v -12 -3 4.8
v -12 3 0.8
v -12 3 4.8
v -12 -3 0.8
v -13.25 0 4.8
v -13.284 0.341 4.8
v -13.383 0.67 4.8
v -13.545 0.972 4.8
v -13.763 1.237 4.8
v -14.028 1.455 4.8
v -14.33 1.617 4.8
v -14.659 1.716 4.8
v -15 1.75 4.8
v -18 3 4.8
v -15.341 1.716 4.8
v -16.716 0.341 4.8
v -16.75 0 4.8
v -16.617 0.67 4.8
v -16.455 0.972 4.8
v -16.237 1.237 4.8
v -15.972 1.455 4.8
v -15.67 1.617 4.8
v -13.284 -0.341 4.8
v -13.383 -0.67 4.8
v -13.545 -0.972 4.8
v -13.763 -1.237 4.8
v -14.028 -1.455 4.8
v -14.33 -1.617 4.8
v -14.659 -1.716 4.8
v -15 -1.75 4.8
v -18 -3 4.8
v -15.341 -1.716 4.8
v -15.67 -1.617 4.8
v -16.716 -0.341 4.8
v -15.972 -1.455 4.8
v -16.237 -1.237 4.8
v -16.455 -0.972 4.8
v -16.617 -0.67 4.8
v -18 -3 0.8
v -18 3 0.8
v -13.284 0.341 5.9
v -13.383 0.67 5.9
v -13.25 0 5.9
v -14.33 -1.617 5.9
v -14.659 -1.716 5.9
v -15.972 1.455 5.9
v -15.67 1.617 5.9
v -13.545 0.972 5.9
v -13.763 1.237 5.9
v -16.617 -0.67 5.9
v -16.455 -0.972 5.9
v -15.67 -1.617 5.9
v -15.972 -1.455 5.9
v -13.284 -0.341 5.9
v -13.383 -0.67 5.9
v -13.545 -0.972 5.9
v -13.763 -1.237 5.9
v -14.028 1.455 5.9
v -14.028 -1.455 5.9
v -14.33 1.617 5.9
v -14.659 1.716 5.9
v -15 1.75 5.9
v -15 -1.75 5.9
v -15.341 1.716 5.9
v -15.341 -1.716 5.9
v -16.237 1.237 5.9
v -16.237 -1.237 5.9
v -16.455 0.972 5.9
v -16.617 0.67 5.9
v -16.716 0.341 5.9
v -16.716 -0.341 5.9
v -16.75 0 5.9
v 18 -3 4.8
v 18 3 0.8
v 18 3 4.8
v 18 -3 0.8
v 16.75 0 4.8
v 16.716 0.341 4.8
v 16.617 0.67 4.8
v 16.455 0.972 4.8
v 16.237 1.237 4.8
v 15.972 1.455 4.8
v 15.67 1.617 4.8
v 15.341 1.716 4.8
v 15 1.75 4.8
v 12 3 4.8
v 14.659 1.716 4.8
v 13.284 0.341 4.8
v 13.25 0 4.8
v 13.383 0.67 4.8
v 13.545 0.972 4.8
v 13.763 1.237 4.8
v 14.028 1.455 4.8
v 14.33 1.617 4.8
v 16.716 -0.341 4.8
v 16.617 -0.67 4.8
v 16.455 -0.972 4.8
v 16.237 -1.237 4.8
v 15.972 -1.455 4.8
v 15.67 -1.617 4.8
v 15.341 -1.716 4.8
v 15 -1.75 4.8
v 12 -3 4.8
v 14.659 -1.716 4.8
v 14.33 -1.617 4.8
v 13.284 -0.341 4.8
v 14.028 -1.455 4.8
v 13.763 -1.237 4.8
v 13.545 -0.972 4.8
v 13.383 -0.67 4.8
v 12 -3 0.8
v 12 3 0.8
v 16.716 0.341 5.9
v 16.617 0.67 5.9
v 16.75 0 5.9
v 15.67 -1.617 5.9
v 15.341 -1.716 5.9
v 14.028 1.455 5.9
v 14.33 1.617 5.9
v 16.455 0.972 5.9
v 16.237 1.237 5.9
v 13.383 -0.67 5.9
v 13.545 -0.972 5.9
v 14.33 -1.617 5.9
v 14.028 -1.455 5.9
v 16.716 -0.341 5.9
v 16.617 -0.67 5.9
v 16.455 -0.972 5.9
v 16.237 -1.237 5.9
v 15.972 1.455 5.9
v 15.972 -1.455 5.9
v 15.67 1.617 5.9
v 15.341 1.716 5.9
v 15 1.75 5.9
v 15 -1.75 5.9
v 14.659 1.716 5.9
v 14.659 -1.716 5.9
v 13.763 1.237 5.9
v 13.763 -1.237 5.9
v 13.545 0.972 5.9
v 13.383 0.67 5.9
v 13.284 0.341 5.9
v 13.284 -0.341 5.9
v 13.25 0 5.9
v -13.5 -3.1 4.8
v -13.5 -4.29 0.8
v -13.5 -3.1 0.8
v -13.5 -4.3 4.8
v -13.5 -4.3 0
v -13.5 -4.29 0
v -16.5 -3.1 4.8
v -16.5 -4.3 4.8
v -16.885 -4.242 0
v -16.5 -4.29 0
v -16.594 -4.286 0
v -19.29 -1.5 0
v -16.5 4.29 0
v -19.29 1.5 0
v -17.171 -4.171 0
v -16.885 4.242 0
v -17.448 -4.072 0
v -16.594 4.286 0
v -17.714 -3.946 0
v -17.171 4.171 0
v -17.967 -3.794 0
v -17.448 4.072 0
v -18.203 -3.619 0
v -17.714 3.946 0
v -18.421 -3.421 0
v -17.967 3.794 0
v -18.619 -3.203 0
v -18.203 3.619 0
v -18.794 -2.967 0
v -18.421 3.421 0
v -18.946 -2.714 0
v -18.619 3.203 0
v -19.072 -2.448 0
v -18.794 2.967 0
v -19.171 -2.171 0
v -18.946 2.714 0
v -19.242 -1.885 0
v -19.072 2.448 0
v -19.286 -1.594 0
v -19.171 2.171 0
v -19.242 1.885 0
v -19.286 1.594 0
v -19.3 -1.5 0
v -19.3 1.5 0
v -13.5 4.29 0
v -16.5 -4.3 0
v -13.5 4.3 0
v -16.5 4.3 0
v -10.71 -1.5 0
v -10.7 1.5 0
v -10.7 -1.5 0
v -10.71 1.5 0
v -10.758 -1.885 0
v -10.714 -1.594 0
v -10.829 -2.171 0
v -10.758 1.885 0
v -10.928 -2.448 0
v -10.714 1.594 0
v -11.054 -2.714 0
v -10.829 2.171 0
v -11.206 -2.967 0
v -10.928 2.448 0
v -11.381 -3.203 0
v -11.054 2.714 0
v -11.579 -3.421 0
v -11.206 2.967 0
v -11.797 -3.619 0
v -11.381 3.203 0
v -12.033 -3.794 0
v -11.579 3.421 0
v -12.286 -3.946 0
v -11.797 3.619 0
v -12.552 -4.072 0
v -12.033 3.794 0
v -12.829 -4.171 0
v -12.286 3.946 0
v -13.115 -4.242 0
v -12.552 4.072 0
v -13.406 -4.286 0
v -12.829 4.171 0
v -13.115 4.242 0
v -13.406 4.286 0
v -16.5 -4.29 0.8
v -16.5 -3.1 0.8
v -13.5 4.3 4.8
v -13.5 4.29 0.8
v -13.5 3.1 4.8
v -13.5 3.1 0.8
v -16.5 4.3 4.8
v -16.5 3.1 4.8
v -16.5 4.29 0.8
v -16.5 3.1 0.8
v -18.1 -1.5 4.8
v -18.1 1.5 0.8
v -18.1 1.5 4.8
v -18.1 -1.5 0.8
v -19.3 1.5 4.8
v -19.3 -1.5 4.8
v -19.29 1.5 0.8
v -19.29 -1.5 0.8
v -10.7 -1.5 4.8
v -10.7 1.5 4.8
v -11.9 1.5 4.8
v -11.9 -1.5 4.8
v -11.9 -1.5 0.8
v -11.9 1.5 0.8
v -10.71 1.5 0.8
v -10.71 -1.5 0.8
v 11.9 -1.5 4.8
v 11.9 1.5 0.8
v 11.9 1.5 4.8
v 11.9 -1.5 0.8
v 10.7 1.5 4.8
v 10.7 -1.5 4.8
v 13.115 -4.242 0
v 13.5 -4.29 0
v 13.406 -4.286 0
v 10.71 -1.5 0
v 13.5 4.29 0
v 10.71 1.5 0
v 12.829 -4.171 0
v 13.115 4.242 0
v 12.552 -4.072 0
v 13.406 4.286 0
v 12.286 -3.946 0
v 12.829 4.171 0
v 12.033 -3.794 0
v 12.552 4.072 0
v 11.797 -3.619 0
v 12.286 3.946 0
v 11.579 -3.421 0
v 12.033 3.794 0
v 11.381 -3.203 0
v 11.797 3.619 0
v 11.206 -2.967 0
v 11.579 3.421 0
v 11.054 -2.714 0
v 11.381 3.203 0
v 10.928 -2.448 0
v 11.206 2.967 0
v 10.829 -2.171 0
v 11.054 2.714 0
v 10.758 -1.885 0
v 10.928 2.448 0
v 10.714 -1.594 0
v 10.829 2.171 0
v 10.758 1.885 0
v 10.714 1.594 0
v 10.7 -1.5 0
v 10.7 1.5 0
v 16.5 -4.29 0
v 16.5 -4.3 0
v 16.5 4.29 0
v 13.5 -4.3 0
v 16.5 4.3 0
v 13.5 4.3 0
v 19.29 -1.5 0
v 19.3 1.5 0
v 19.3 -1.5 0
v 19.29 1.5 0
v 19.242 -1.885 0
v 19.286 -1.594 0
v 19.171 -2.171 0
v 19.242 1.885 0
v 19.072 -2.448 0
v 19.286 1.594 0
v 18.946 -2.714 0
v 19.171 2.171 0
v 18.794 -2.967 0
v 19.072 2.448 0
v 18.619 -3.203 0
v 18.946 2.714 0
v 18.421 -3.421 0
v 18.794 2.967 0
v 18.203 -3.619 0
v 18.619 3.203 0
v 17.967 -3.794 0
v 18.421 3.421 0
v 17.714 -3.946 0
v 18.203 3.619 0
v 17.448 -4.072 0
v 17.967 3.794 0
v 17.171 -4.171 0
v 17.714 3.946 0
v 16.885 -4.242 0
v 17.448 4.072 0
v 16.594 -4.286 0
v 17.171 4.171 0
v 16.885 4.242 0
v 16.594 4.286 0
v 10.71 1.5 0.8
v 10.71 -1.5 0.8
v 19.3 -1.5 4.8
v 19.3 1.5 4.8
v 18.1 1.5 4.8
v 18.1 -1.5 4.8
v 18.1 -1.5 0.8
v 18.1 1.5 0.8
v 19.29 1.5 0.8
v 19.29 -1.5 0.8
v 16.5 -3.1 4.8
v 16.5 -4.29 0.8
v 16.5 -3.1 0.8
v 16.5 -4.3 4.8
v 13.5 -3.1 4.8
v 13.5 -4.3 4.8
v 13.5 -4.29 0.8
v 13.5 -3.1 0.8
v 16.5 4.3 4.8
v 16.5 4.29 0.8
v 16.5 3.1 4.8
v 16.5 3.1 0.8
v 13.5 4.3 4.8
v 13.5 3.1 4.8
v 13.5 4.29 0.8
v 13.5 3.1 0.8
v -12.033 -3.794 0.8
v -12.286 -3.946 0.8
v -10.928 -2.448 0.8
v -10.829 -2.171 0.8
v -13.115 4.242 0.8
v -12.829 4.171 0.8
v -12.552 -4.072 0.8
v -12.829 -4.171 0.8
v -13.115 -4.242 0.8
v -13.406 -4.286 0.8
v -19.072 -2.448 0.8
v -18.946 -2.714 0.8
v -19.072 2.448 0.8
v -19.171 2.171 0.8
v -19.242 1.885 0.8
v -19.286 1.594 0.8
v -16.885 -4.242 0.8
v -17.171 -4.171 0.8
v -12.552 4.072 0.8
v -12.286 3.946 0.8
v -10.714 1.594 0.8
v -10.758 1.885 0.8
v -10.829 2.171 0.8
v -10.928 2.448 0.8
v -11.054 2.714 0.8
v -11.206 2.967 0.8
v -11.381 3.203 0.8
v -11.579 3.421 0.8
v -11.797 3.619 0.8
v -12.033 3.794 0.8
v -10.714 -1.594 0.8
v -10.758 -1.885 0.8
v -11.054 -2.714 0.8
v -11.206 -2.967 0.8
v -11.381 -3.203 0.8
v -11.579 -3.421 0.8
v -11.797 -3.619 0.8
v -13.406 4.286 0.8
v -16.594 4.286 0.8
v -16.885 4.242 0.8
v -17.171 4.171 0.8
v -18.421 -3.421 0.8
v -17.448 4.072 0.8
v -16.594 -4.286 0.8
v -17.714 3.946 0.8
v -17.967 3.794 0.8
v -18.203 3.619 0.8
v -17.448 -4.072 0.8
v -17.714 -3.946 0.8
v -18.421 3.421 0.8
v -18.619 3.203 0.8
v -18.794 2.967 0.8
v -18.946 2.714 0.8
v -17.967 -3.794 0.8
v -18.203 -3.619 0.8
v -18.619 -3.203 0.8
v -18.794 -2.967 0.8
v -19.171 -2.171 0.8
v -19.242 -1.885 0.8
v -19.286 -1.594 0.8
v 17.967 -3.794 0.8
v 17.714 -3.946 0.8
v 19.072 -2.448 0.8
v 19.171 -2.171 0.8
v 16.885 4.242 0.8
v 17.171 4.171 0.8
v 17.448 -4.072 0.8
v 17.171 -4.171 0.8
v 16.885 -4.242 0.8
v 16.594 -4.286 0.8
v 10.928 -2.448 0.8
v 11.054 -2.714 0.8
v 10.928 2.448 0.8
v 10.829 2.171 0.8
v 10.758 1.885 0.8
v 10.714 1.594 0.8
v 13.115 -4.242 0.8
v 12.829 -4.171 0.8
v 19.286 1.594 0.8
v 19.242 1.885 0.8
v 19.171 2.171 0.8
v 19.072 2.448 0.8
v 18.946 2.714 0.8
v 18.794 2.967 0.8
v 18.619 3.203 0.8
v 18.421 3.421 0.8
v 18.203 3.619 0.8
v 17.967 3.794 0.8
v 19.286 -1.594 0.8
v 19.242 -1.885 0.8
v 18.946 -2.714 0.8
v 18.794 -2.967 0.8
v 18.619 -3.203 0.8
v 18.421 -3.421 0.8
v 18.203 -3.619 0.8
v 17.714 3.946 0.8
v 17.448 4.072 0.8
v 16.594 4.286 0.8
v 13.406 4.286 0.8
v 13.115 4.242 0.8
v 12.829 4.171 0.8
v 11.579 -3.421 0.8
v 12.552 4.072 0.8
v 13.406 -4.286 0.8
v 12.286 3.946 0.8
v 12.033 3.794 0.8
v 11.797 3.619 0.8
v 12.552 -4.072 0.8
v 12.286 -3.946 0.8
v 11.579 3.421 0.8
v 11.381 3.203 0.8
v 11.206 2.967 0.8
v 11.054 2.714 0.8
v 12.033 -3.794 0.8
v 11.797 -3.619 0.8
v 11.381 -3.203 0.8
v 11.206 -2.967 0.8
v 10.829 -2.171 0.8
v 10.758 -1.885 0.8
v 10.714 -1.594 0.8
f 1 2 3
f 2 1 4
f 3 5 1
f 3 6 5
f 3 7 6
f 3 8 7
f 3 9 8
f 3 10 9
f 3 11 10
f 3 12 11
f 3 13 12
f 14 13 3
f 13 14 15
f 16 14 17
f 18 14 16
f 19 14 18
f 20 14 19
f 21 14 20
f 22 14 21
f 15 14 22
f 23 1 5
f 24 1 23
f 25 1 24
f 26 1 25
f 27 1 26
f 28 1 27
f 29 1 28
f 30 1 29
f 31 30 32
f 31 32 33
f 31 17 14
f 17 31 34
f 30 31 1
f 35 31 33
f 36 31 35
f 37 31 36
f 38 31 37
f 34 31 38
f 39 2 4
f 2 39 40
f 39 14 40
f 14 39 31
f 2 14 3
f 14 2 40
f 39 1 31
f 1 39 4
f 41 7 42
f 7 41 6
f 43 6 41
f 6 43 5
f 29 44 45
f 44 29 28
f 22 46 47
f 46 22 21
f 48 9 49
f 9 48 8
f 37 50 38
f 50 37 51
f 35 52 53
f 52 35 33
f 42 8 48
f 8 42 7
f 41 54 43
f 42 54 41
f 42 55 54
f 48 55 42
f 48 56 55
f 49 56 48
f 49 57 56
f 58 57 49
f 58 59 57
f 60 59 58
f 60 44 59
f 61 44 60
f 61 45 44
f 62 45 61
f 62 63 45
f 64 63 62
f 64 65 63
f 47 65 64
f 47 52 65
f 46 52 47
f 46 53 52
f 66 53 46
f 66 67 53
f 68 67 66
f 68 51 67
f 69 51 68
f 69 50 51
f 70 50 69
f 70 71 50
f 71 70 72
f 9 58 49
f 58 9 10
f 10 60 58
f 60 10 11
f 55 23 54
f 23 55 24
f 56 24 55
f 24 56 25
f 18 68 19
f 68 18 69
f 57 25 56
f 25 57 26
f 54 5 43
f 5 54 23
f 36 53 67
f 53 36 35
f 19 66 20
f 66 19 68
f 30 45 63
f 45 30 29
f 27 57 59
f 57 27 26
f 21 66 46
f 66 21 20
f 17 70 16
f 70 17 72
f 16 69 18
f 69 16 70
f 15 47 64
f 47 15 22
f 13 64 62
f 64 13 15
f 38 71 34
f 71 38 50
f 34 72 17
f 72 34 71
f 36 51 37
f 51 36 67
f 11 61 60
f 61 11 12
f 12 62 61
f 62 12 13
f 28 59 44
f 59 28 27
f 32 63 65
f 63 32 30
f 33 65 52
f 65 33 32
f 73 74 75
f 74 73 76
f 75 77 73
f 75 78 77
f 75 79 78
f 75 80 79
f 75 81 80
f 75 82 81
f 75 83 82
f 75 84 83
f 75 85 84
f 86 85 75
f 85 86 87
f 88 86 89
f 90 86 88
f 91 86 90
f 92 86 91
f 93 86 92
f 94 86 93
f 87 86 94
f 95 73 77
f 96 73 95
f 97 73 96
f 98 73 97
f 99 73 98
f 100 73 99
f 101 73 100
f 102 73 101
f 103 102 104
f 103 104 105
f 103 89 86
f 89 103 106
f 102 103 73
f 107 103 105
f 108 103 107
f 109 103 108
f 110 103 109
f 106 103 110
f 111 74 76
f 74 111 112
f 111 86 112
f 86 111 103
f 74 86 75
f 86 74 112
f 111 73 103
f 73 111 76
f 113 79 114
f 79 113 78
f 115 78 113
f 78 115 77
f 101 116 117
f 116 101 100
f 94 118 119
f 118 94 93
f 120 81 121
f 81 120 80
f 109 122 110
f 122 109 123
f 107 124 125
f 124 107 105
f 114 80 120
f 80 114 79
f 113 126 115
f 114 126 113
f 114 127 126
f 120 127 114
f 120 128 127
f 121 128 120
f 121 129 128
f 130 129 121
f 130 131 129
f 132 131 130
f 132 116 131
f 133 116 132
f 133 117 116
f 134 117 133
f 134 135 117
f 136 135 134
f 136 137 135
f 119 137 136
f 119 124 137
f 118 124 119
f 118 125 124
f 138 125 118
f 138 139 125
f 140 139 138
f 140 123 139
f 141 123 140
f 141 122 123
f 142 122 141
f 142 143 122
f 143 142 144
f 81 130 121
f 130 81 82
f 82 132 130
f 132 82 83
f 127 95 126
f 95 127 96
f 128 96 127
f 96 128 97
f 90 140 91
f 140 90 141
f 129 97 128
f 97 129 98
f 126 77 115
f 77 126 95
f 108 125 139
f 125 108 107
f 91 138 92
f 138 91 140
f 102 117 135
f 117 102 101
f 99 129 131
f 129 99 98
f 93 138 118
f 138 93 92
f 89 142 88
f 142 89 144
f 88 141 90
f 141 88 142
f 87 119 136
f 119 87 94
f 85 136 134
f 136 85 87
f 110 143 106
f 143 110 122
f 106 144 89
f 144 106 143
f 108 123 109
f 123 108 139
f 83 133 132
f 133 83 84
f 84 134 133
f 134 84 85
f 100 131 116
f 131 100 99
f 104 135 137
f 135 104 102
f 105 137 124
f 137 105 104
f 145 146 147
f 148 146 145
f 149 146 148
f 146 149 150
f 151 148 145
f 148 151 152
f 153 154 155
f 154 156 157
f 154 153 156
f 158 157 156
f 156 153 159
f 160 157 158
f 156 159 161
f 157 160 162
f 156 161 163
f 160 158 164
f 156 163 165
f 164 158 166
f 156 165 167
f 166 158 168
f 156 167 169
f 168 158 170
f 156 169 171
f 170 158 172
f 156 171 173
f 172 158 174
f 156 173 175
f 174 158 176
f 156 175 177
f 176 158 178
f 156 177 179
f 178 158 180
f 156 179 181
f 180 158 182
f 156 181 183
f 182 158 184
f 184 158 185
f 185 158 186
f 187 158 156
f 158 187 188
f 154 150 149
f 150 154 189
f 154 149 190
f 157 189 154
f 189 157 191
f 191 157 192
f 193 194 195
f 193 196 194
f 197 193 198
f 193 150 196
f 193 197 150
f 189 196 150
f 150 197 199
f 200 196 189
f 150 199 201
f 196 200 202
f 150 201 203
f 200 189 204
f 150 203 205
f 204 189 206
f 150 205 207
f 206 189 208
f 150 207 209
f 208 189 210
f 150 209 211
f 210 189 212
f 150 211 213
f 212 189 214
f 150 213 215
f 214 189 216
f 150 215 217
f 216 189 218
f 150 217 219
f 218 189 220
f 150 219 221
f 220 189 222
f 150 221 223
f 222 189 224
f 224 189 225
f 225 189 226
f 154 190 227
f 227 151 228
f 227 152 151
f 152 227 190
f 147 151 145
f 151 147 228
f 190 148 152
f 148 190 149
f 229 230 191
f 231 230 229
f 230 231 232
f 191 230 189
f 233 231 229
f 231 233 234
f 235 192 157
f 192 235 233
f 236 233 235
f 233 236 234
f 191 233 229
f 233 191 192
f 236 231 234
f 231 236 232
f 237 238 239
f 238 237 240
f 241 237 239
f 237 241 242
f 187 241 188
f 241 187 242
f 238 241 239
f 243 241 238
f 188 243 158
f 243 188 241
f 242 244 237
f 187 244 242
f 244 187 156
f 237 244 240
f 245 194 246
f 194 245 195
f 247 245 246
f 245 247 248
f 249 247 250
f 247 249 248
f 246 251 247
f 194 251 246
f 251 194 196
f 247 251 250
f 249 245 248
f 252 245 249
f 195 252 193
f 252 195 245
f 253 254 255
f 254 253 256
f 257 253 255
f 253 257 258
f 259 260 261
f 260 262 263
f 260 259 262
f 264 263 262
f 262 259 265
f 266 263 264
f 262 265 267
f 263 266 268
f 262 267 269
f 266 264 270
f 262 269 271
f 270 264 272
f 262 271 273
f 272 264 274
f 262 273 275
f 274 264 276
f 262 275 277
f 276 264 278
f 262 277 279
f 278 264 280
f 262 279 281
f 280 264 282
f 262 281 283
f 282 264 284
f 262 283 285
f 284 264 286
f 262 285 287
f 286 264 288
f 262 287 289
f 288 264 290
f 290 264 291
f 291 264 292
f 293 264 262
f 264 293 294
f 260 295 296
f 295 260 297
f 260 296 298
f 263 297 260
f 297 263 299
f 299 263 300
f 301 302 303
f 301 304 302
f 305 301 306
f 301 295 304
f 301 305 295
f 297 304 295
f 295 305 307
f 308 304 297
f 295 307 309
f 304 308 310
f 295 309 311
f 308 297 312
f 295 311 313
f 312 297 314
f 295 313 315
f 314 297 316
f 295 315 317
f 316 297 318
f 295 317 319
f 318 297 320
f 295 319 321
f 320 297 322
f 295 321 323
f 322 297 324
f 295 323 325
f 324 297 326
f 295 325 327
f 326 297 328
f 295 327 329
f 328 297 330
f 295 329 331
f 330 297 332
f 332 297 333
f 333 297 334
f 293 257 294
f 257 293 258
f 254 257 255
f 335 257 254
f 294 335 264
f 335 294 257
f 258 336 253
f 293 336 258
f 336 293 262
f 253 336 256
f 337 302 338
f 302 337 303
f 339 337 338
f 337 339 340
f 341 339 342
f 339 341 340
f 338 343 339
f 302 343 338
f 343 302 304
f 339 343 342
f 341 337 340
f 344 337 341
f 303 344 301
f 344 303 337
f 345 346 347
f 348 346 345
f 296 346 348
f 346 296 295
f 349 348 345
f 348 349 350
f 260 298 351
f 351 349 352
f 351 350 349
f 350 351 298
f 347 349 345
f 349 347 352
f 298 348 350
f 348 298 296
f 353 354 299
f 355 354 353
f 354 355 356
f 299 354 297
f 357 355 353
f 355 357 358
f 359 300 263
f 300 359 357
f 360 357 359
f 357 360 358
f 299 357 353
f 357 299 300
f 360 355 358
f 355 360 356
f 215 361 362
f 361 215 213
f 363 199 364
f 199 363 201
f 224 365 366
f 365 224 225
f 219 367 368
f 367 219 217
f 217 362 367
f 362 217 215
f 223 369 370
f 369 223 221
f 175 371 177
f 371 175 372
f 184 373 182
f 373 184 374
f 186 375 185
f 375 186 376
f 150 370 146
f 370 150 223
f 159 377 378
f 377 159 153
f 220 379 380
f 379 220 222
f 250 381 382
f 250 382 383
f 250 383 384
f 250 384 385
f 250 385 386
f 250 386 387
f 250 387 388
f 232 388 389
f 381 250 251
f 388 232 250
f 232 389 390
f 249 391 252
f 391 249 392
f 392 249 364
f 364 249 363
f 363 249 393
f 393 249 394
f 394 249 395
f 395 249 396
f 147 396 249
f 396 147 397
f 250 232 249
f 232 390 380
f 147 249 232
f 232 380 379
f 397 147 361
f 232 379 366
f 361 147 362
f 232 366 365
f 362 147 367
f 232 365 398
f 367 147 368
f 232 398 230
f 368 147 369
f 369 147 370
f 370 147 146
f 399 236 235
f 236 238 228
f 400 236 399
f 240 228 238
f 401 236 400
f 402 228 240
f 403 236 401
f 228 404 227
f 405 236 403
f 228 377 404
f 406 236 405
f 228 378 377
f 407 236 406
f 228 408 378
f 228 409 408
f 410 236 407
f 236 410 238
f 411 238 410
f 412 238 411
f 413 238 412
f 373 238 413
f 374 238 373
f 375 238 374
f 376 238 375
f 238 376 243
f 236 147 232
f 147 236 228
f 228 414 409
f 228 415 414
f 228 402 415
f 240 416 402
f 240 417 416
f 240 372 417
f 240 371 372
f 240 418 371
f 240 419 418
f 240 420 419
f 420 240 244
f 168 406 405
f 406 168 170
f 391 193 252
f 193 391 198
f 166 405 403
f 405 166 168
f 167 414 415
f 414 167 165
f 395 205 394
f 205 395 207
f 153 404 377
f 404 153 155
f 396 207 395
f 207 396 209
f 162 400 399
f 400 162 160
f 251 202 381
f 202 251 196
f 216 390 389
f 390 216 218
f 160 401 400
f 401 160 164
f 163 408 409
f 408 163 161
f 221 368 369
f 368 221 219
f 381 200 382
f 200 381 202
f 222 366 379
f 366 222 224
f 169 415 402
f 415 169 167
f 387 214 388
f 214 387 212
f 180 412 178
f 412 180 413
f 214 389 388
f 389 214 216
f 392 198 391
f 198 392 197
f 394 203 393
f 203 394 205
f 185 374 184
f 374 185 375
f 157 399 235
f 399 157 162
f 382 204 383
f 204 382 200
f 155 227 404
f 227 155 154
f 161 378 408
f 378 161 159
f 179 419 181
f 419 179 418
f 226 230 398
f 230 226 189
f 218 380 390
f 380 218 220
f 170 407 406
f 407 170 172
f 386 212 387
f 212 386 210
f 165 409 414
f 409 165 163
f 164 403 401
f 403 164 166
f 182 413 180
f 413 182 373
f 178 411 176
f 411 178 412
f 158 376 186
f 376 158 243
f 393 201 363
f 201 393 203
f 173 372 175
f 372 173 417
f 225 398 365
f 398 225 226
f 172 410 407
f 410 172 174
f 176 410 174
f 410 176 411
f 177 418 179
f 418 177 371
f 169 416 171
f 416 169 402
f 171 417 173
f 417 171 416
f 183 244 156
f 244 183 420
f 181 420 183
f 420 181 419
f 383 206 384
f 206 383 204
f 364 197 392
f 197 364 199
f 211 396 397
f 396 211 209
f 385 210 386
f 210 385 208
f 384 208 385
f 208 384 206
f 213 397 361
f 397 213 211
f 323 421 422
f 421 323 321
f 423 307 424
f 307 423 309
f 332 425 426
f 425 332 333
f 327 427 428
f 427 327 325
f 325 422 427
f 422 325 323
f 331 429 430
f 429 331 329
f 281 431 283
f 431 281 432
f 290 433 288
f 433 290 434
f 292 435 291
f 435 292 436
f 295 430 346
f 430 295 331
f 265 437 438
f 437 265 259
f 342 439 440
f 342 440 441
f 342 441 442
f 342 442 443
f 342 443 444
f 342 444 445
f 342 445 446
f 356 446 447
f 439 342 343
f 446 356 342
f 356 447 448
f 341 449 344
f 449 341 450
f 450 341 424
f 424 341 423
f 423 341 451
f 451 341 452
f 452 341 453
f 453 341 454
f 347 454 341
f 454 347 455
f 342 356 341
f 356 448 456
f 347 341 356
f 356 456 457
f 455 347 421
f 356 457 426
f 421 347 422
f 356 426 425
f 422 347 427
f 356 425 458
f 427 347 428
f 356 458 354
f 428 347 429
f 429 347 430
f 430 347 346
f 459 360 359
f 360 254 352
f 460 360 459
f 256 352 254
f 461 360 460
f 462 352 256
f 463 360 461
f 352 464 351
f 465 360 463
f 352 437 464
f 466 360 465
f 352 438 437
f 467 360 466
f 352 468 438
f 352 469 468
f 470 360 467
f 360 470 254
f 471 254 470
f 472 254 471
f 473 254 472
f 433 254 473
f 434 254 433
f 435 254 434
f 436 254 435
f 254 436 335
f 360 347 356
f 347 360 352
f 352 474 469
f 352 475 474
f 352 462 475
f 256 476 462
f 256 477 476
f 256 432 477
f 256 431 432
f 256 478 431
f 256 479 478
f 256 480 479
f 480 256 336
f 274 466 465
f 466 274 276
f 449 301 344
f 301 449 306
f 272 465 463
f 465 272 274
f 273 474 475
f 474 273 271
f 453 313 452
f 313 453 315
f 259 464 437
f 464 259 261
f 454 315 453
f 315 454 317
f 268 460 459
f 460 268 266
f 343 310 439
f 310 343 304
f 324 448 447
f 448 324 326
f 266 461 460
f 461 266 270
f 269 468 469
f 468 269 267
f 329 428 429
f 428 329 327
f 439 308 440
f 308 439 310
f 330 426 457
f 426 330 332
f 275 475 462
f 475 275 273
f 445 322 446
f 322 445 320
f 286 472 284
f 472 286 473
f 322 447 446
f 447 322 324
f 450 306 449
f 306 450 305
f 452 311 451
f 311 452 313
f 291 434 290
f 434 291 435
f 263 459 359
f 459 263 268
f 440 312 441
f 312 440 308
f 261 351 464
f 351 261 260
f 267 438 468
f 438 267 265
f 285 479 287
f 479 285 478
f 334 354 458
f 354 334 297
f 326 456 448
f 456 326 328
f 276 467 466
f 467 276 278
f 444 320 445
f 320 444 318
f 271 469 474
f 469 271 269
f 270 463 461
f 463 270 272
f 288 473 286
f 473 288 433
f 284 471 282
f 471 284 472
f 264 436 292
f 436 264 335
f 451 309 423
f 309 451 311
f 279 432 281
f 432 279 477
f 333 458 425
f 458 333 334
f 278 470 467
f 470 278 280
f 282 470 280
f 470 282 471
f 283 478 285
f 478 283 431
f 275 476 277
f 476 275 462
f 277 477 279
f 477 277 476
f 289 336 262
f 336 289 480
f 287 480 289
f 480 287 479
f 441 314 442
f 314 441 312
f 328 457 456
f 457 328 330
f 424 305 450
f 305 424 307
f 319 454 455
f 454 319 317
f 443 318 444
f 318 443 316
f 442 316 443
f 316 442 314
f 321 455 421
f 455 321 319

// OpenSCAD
EPSILON = 0.001;

BUTTON_SIZE = 6;
BUTTON_HEIGHT = 4;

WALL_THICKNESS = 1.2;
BUTTON_MARGIN = 0.1;

/**
 * Buttons.
 *
 * @param positiveShape
 *     if true, draw only the positive part.
 *     if false, draw only the negative part.
 */
module PushButtons(baseThickness = 0.8,
                   distanceBetweenButtons = 30,
                   positiveShape = true) {
    if (positiveShape) {
        for (x = [-distanceBetweenButtons / 2, distanceBetweenButtons / 2])
            translate([x, 0, baseThickness]) {
                // Base
                translate([-BUTTON_SIZE / 2, -BUTTON_SIZE / 2, 0])
                    cube([BUTTON_SIZE, BUTTON_SIZE, BUTTON_HEIGHT]);
                
                // Moving part
                diameter = 3.5;
                
                translate([diameter / 2 + (BUTTON_SIZE - diameter) / 2 - BUTTON_SIZE / 2,
                           diameter / 2 + (BUTTON_SIZE - diameter) / 2 - BUTTON_SIZE / 2,
                           0])
                    cylinder(h = 5.1, d = diameter, $fn = 32);
            }
    }
}


/**
 * Button holders.
 *
 * @param positiveShape
 *     if true, draw only the positive part.
 *     if false, draw only the negative part.
 */
module PushButtons_holder(baseThickness = 0.8, distanceBetweenButtons = 30, positiveShape = true) {
    for (x = [-distanceBetweenButtons / 2, distanceBetweenButtons / 2]) {
        // Base
        baseSize = BUTTON_SIZE + 2 * (WALL_THICKNESS + BUTTON_MARGIN);
        if (positiveShape) {
            translate([-baseSize / 2 + x, -baseSize / 2, 0])
                linear_extrude(height = baseThickness)
                    offset(r = 3, $fn = 64)
                        offset(r = -3, $fn = 64)
                            square([baseSize, baseSize]);
        }
        
        // Horizontal wall around each button
        wallWidth = BUTTON_SIZE - 3;
        wallHeight = BUTTON_HEIGHT + baseThickness;
        if (positiveShape) {
            for (y = [-BUTTON_SIZE / 2 - WALL_THICKNESS / 2 - BUTTON_MARGIN,
                      BUTTON_SIZE / 2 + WALL_THICKNESS / 2 + BUTTON_MARGIN])
                translate([-wallWidth / 2 + x, -WALL_THICKNESS / 2 + y, 0]) {
                    cube([wallWidth, WALL_THICKNESS, wallHeight]);
                }
        }
        
        // Vertical wall around each button
        if (positiveShape) {
            for (x = [-(distanceBetweenButtons + BUTTON_SIZE + WALL_THICKNESS) / 2 - BUTTON_MARGIN,
                      -(distanceBetweenButtons - BUTTON_SIZE - WALL_THICKNESS) / 2 + BUTTON_MARGIN,
                      (distanceBetweenButtons - BUTTON_SIZE - WALL_THICKNESS) / 2 - BUTTON_MARGIN,
                      (distanceBetweenButtons + BUTTON_SIZE + WALL_THICKNESS) / 2 + BUTTON_MARGIN]) {
                translate([-WALL_THICKNESS / 2 + x, -wallWidth / 2, 0]) {
                    cube([WALL_THICKNESS, wallWidth, wallHeight]);
                }
            }
        }
    }
}

/**
 * Buttons cover on the front panel.
 *
 * @param positiveShape
 *     if true, draw only the positive part.
 *     if false, draw only the negative part.
 */
module PushButtons_cover(baseThickness = 0.8, width = 50, depth = 18, positiveShape = true) {
    // Cut the buttons in the cover
    if (!positiveShape) {
        gap = 0.4;
        centralSupportWidth = 10;
        
        difference() {
            translate([0, 0, -EPSILON])
                linear_extrude(height = baseThickness + 2 * EPSILON)
                    difference() {
                        _PushButtons_coverShape(width, depth);
                        translate([gap, gap])
                            _PushButtons_coverShape(width - 2 * gap, depth - 2 * gap);
                    }
                
            // Central holder
            translate([(width - centralSupportWidth) / 2, 0, -0.1])
                cube([centralSupportWidth, depth * 2, baseThickness]);
        }
    }
}

module _PushButtons_coverShape(width = 50, depth = 18) {
    circleRadius = width / 2;
    cornerRadius = 4;
    outerCornerRadius = 2;
    
    offset(r = outerCornerRadius, $fn = 32)
        offset(r = -outerCornerRadius, $fn = 32)
            difference() {
                offset(r = cornerRadius, $fn = 32)
                    offset(r = -cornerRadius, $fn = 32) {
                            difference() {
                                translate([circleRadius, circleRadius])
                                    intersection() {
                                        scale([1.5, 1])
                                            circle(r = circleRadius, $fn = 128);
                                        
                                        trapezoidRatio = 1/30;
                                        polygon(points = [
                                            [-width / 2, depth / 2],
                                            [-width / 2 + trapezoidRatio * width, -width / 2],
                                            [width / 2 - trapezoidRatio * width, -width / 2],
                                            [width / 2, depth / 2]
                                        ]);
                                    }
                                
                                translate([width / 2, -1])
                                    offset(r = cornerRadius, $fn = 32)
                                        polygon(points = [
                                                [-4, 3],
                                                [4, 3],
                                                [6.6, 0],
                                                [-6.6, 0]
                                        ]);
                            }
                        }

                translate([circleRadius, circleRadius + depth])
                    scale([2, 1])
                        circle(r = circleRadius, $fn = 128);
            }
}



color("gray")
    difference() {
        PushButtons(0.8, 30, true);
        PushButtons(0.8, 30, false);
    }
    
difference() {
    PushButtons_holder(0.8, 30, true);
    PushButtons_holder(0.8, 30, false);
}

/*
difference() {
    PushButtons_cover(baseThickness = 0.8, positiveShape = true);
    PushButtons_cover(baseThickness = 0.8, positiveShape = false);
}
*/
